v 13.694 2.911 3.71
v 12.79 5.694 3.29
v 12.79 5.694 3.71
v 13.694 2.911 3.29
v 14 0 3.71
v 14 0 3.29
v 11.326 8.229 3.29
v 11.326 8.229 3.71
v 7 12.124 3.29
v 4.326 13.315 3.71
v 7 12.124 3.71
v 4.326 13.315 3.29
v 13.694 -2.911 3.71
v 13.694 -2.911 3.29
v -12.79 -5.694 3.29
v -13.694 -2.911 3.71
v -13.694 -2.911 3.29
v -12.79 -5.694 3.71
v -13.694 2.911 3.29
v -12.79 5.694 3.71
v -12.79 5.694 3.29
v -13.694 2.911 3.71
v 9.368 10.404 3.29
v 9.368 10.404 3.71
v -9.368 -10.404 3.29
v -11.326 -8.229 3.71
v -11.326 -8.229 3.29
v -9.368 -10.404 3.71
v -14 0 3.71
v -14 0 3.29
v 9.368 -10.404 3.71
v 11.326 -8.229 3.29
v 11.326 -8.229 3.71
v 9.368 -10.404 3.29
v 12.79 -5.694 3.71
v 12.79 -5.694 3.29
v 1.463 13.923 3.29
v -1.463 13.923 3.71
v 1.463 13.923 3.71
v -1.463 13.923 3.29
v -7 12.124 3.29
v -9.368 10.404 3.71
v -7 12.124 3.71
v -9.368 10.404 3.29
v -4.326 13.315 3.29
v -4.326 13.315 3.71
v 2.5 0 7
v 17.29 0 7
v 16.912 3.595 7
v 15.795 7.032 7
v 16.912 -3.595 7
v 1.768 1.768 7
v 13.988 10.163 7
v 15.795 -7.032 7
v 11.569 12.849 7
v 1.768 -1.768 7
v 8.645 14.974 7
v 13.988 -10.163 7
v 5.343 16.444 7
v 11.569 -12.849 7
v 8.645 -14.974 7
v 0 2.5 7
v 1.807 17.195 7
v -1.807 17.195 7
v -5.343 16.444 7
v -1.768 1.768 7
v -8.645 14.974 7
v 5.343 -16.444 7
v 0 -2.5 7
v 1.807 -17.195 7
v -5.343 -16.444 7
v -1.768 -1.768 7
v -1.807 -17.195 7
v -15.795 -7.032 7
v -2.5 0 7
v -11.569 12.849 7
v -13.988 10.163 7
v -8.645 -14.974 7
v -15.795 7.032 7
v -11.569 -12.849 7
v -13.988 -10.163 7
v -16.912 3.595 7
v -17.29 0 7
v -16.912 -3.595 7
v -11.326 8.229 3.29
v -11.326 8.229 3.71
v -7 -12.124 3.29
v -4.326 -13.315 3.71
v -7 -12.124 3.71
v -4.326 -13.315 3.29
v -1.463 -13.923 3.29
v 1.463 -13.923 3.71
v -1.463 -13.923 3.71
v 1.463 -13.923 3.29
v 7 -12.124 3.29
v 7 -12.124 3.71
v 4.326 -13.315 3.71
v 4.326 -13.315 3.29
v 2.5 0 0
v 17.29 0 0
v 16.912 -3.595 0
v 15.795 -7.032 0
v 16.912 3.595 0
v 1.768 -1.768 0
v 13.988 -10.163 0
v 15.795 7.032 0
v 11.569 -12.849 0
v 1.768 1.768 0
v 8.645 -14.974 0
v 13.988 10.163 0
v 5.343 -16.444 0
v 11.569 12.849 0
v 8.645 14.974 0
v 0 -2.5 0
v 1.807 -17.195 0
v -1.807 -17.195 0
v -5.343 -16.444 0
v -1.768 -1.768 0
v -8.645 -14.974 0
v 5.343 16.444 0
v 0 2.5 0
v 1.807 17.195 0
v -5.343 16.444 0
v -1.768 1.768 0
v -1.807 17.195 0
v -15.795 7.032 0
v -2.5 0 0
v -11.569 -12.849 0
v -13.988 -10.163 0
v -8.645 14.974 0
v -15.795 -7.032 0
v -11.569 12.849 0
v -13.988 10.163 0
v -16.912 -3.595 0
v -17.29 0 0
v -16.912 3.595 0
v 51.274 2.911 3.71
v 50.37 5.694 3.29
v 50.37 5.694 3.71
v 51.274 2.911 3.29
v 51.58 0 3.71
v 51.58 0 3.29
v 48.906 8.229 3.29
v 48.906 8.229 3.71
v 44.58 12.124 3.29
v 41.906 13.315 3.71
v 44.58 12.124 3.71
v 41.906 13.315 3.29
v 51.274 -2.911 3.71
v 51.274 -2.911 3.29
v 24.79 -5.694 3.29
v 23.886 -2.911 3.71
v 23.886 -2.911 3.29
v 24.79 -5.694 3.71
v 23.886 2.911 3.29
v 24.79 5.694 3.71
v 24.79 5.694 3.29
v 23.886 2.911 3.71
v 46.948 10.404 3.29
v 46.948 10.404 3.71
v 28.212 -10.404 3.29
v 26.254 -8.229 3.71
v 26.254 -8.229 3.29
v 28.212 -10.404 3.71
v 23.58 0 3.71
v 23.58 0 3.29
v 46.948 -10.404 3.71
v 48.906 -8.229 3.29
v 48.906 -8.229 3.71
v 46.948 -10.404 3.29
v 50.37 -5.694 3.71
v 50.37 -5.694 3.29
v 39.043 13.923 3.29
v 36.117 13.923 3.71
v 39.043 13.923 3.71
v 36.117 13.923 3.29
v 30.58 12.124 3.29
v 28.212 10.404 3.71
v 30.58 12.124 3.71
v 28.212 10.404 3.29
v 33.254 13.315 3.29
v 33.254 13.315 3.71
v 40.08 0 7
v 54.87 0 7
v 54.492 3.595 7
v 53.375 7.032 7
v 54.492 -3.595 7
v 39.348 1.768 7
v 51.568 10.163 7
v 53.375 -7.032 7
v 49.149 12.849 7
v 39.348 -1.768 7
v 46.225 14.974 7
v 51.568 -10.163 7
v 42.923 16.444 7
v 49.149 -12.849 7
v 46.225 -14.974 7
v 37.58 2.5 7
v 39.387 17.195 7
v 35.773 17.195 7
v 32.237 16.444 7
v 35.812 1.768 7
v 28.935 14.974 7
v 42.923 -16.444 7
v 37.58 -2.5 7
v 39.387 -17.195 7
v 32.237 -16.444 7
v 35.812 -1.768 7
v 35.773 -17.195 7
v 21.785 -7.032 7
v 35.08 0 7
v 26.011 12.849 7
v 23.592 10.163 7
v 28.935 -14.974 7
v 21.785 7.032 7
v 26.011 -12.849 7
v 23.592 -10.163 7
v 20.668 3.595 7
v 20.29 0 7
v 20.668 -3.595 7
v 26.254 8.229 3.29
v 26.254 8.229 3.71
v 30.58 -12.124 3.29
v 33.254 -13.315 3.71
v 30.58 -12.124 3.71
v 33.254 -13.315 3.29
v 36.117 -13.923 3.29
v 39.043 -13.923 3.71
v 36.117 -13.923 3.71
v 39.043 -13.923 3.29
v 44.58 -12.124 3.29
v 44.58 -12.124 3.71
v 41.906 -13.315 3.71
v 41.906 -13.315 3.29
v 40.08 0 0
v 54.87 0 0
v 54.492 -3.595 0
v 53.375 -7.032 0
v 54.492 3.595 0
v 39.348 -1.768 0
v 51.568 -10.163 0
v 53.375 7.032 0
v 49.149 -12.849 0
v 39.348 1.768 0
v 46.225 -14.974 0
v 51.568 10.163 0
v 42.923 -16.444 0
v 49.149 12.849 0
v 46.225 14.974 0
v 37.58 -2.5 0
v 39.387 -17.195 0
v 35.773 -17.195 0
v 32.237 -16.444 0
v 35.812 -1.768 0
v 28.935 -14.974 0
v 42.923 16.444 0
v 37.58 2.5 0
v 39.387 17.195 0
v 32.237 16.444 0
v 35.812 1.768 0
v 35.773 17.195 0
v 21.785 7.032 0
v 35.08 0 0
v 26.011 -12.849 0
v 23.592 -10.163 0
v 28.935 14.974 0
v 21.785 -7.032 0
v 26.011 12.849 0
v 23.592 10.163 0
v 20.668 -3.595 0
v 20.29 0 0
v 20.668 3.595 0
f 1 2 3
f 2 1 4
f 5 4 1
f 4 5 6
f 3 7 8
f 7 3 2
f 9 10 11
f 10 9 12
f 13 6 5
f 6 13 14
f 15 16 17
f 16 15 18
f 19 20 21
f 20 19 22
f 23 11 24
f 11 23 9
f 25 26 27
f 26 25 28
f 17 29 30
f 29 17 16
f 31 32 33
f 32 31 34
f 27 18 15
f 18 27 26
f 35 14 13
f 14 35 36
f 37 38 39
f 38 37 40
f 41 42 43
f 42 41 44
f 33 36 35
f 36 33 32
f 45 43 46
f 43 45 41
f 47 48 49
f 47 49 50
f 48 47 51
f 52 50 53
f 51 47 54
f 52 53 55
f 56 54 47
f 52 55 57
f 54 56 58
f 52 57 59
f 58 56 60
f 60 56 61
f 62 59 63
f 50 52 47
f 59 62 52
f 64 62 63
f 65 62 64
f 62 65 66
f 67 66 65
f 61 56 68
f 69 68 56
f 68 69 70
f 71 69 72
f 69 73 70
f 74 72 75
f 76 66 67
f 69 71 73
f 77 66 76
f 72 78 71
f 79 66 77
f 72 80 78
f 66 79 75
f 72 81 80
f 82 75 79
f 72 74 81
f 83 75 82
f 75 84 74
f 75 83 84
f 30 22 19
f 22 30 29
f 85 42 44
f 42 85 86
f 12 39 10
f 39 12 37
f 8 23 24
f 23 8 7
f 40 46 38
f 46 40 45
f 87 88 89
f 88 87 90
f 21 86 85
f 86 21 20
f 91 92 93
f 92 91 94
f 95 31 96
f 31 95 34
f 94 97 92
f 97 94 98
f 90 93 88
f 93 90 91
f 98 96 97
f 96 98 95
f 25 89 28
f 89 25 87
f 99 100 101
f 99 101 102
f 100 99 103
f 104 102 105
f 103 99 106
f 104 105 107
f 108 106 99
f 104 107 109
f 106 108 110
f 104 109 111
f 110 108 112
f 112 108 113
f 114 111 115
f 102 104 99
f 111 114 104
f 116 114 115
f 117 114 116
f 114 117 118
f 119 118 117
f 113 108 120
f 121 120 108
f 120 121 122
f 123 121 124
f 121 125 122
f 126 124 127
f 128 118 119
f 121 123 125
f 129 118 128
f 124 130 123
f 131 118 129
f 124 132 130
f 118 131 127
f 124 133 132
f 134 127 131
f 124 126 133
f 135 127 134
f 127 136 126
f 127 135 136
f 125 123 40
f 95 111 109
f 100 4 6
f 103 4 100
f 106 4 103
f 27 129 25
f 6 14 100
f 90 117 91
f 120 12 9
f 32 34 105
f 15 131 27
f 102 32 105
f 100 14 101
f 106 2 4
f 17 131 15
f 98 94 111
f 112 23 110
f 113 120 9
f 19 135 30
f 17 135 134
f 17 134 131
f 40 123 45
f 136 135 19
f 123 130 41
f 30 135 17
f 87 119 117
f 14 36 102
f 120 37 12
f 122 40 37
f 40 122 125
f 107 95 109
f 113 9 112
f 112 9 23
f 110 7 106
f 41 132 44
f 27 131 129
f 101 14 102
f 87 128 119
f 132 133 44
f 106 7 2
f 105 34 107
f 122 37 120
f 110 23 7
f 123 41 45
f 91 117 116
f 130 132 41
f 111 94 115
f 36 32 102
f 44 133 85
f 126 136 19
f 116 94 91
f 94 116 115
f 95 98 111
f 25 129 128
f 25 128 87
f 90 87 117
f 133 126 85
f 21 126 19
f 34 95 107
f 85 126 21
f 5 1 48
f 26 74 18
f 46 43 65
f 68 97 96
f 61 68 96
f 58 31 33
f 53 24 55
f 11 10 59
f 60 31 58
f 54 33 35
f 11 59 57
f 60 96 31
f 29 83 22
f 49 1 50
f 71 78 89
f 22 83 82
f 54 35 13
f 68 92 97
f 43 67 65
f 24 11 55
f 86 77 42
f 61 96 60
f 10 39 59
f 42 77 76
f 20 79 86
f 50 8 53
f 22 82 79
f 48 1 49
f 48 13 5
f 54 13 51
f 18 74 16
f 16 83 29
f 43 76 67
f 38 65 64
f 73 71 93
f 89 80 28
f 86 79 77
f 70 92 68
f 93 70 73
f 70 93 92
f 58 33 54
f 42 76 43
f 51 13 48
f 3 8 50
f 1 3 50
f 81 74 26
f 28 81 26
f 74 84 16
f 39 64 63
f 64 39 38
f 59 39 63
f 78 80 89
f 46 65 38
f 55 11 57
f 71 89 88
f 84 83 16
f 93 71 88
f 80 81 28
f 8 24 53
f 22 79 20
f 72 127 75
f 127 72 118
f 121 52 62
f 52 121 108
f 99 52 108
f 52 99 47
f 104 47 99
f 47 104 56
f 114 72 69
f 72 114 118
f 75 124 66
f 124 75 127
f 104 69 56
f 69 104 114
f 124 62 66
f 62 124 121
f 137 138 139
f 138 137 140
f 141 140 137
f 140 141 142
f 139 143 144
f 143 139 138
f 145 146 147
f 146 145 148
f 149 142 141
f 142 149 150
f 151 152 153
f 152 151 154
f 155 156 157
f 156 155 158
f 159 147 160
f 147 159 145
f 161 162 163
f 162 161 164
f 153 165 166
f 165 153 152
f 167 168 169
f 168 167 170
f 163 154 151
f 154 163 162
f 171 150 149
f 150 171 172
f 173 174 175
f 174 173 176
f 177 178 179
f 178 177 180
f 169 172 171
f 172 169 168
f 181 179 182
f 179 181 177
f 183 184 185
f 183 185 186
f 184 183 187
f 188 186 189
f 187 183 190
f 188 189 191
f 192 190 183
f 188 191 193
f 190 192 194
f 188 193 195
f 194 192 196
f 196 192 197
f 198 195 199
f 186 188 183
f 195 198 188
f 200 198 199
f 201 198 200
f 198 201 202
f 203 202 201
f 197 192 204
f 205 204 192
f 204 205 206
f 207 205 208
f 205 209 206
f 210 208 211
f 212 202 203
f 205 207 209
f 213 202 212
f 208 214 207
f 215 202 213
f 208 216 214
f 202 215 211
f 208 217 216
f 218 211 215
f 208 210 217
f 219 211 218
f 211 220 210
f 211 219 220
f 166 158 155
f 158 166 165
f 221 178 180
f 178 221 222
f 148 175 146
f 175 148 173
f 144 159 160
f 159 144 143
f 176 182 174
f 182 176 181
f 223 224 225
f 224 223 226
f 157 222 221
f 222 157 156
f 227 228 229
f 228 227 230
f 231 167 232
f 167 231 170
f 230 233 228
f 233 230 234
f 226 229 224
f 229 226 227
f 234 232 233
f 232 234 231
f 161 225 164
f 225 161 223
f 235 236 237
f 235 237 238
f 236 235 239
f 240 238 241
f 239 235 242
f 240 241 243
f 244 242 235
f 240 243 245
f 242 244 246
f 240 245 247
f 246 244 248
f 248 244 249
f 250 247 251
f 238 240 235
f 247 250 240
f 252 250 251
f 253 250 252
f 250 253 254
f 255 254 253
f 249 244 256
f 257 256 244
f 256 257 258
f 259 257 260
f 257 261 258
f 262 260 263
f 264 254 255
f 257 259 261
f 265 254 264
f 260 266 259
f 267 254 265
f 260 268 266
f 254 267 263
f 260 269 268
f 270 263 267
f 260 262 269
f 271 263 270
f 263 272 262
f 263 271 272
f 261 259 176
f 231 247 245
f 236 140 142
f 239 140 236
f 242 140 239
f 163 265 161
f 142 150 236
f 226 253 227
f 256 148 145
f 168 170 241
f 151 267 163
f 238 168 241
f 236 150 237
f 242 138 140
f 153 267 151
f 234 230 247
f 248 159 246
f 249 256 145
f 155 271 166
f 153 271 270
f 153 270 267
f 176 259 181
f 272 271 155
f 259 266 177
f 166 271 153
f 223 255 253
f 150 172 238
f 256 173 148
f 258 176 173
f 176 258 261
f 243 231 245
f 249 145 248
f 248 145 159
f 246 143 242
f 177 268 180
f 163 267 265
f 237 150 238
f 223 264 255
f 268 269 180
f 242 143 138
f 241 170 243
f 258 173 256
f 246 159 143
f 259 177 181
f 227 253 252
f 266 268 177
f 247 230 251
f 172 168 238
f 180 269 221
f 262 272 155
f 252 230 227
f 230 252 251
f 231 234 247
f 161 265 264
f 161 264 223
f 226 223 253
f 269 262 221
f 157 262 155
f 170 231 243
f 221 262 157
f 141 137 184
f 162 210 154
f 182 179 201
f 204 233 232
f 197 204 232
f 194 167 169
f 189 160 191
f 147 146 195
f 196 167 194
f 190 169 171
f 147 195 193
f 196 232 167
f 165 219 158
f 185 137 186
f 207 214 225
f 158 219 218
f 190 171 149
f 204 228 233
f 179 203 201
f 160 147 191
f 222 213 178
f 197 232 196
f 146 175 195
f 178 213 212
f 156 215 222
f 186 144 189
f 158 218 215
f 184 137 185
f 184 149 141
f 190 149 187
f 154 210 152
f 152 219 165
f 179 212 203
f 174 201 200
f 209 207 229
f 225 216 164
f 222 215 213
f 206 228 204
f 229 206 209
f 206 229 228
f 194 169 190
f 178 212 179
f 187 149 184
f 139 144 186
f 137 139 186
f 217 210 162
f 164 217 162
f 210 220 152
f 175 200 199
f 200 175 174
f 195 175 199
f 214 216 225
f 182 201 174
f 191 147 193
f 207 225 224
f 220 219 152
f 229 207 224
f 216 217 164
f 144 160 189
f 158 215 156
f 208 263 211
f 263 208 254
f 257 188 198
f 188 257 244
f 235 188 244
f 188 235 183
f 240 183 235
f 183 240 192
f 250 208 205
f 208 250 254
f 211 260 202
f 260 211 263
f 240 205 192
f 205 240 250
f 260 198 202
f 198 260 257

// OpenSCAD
// file: configuration.scad
// printer properties
layer_height = 0.3;
single_wall_width = layer_height * 2.2;

// bot part properties
bearing_radius = 11;
shaft_radius = 2.5;
// main file
// Drive pulley
// GNU GPL v3
// Václav 'ax' Hůla <axtheb@gmail.com>
// this is really just string guide with few touches. 
// TODO: refactor

include <configuration.scad>

guide_height = 7;

offset=0.47;

// thickness of the ring in thinnest part
wall_min_thickness = 14 - shaft_radius;
// outer (max) thickness of the ring
wall_max_thickness = wall_min_thickness + offset * guide_height;

module drive_pulley()
{
    difference()
    {
        union(){
            cylinder(r = shaft_radius + wall_min_thickness, h = guide_height);
            cylinder(r1 = shaft_radius + wall_max_thickness, r2 = shaft_radius + wall_min_thickness, h = guide_height * offset);
            translate([0, 0, guide_height * (1 - offset)])
                cylinder(r2 = shaft_radius + wall_max_thickness, r1 = shaft_radius + wall_min_thickness, h = guide_height * offset);
        }
        translate([0, 0, -1])
            cylinder(r = shaft_radius, h = guide_height + 2);  // putting low $fn may be good idea to assure nice press-fit
    }
}

pulley_spacing = 3 + 2 * (shaft_radius + wall_max_thickness);

// there are two idlers with guide in middle, for far inner corners
for(i = [0:1]) {
    translate ([i * pulley_spacing, 0, 0]) drive_pulley();
}
